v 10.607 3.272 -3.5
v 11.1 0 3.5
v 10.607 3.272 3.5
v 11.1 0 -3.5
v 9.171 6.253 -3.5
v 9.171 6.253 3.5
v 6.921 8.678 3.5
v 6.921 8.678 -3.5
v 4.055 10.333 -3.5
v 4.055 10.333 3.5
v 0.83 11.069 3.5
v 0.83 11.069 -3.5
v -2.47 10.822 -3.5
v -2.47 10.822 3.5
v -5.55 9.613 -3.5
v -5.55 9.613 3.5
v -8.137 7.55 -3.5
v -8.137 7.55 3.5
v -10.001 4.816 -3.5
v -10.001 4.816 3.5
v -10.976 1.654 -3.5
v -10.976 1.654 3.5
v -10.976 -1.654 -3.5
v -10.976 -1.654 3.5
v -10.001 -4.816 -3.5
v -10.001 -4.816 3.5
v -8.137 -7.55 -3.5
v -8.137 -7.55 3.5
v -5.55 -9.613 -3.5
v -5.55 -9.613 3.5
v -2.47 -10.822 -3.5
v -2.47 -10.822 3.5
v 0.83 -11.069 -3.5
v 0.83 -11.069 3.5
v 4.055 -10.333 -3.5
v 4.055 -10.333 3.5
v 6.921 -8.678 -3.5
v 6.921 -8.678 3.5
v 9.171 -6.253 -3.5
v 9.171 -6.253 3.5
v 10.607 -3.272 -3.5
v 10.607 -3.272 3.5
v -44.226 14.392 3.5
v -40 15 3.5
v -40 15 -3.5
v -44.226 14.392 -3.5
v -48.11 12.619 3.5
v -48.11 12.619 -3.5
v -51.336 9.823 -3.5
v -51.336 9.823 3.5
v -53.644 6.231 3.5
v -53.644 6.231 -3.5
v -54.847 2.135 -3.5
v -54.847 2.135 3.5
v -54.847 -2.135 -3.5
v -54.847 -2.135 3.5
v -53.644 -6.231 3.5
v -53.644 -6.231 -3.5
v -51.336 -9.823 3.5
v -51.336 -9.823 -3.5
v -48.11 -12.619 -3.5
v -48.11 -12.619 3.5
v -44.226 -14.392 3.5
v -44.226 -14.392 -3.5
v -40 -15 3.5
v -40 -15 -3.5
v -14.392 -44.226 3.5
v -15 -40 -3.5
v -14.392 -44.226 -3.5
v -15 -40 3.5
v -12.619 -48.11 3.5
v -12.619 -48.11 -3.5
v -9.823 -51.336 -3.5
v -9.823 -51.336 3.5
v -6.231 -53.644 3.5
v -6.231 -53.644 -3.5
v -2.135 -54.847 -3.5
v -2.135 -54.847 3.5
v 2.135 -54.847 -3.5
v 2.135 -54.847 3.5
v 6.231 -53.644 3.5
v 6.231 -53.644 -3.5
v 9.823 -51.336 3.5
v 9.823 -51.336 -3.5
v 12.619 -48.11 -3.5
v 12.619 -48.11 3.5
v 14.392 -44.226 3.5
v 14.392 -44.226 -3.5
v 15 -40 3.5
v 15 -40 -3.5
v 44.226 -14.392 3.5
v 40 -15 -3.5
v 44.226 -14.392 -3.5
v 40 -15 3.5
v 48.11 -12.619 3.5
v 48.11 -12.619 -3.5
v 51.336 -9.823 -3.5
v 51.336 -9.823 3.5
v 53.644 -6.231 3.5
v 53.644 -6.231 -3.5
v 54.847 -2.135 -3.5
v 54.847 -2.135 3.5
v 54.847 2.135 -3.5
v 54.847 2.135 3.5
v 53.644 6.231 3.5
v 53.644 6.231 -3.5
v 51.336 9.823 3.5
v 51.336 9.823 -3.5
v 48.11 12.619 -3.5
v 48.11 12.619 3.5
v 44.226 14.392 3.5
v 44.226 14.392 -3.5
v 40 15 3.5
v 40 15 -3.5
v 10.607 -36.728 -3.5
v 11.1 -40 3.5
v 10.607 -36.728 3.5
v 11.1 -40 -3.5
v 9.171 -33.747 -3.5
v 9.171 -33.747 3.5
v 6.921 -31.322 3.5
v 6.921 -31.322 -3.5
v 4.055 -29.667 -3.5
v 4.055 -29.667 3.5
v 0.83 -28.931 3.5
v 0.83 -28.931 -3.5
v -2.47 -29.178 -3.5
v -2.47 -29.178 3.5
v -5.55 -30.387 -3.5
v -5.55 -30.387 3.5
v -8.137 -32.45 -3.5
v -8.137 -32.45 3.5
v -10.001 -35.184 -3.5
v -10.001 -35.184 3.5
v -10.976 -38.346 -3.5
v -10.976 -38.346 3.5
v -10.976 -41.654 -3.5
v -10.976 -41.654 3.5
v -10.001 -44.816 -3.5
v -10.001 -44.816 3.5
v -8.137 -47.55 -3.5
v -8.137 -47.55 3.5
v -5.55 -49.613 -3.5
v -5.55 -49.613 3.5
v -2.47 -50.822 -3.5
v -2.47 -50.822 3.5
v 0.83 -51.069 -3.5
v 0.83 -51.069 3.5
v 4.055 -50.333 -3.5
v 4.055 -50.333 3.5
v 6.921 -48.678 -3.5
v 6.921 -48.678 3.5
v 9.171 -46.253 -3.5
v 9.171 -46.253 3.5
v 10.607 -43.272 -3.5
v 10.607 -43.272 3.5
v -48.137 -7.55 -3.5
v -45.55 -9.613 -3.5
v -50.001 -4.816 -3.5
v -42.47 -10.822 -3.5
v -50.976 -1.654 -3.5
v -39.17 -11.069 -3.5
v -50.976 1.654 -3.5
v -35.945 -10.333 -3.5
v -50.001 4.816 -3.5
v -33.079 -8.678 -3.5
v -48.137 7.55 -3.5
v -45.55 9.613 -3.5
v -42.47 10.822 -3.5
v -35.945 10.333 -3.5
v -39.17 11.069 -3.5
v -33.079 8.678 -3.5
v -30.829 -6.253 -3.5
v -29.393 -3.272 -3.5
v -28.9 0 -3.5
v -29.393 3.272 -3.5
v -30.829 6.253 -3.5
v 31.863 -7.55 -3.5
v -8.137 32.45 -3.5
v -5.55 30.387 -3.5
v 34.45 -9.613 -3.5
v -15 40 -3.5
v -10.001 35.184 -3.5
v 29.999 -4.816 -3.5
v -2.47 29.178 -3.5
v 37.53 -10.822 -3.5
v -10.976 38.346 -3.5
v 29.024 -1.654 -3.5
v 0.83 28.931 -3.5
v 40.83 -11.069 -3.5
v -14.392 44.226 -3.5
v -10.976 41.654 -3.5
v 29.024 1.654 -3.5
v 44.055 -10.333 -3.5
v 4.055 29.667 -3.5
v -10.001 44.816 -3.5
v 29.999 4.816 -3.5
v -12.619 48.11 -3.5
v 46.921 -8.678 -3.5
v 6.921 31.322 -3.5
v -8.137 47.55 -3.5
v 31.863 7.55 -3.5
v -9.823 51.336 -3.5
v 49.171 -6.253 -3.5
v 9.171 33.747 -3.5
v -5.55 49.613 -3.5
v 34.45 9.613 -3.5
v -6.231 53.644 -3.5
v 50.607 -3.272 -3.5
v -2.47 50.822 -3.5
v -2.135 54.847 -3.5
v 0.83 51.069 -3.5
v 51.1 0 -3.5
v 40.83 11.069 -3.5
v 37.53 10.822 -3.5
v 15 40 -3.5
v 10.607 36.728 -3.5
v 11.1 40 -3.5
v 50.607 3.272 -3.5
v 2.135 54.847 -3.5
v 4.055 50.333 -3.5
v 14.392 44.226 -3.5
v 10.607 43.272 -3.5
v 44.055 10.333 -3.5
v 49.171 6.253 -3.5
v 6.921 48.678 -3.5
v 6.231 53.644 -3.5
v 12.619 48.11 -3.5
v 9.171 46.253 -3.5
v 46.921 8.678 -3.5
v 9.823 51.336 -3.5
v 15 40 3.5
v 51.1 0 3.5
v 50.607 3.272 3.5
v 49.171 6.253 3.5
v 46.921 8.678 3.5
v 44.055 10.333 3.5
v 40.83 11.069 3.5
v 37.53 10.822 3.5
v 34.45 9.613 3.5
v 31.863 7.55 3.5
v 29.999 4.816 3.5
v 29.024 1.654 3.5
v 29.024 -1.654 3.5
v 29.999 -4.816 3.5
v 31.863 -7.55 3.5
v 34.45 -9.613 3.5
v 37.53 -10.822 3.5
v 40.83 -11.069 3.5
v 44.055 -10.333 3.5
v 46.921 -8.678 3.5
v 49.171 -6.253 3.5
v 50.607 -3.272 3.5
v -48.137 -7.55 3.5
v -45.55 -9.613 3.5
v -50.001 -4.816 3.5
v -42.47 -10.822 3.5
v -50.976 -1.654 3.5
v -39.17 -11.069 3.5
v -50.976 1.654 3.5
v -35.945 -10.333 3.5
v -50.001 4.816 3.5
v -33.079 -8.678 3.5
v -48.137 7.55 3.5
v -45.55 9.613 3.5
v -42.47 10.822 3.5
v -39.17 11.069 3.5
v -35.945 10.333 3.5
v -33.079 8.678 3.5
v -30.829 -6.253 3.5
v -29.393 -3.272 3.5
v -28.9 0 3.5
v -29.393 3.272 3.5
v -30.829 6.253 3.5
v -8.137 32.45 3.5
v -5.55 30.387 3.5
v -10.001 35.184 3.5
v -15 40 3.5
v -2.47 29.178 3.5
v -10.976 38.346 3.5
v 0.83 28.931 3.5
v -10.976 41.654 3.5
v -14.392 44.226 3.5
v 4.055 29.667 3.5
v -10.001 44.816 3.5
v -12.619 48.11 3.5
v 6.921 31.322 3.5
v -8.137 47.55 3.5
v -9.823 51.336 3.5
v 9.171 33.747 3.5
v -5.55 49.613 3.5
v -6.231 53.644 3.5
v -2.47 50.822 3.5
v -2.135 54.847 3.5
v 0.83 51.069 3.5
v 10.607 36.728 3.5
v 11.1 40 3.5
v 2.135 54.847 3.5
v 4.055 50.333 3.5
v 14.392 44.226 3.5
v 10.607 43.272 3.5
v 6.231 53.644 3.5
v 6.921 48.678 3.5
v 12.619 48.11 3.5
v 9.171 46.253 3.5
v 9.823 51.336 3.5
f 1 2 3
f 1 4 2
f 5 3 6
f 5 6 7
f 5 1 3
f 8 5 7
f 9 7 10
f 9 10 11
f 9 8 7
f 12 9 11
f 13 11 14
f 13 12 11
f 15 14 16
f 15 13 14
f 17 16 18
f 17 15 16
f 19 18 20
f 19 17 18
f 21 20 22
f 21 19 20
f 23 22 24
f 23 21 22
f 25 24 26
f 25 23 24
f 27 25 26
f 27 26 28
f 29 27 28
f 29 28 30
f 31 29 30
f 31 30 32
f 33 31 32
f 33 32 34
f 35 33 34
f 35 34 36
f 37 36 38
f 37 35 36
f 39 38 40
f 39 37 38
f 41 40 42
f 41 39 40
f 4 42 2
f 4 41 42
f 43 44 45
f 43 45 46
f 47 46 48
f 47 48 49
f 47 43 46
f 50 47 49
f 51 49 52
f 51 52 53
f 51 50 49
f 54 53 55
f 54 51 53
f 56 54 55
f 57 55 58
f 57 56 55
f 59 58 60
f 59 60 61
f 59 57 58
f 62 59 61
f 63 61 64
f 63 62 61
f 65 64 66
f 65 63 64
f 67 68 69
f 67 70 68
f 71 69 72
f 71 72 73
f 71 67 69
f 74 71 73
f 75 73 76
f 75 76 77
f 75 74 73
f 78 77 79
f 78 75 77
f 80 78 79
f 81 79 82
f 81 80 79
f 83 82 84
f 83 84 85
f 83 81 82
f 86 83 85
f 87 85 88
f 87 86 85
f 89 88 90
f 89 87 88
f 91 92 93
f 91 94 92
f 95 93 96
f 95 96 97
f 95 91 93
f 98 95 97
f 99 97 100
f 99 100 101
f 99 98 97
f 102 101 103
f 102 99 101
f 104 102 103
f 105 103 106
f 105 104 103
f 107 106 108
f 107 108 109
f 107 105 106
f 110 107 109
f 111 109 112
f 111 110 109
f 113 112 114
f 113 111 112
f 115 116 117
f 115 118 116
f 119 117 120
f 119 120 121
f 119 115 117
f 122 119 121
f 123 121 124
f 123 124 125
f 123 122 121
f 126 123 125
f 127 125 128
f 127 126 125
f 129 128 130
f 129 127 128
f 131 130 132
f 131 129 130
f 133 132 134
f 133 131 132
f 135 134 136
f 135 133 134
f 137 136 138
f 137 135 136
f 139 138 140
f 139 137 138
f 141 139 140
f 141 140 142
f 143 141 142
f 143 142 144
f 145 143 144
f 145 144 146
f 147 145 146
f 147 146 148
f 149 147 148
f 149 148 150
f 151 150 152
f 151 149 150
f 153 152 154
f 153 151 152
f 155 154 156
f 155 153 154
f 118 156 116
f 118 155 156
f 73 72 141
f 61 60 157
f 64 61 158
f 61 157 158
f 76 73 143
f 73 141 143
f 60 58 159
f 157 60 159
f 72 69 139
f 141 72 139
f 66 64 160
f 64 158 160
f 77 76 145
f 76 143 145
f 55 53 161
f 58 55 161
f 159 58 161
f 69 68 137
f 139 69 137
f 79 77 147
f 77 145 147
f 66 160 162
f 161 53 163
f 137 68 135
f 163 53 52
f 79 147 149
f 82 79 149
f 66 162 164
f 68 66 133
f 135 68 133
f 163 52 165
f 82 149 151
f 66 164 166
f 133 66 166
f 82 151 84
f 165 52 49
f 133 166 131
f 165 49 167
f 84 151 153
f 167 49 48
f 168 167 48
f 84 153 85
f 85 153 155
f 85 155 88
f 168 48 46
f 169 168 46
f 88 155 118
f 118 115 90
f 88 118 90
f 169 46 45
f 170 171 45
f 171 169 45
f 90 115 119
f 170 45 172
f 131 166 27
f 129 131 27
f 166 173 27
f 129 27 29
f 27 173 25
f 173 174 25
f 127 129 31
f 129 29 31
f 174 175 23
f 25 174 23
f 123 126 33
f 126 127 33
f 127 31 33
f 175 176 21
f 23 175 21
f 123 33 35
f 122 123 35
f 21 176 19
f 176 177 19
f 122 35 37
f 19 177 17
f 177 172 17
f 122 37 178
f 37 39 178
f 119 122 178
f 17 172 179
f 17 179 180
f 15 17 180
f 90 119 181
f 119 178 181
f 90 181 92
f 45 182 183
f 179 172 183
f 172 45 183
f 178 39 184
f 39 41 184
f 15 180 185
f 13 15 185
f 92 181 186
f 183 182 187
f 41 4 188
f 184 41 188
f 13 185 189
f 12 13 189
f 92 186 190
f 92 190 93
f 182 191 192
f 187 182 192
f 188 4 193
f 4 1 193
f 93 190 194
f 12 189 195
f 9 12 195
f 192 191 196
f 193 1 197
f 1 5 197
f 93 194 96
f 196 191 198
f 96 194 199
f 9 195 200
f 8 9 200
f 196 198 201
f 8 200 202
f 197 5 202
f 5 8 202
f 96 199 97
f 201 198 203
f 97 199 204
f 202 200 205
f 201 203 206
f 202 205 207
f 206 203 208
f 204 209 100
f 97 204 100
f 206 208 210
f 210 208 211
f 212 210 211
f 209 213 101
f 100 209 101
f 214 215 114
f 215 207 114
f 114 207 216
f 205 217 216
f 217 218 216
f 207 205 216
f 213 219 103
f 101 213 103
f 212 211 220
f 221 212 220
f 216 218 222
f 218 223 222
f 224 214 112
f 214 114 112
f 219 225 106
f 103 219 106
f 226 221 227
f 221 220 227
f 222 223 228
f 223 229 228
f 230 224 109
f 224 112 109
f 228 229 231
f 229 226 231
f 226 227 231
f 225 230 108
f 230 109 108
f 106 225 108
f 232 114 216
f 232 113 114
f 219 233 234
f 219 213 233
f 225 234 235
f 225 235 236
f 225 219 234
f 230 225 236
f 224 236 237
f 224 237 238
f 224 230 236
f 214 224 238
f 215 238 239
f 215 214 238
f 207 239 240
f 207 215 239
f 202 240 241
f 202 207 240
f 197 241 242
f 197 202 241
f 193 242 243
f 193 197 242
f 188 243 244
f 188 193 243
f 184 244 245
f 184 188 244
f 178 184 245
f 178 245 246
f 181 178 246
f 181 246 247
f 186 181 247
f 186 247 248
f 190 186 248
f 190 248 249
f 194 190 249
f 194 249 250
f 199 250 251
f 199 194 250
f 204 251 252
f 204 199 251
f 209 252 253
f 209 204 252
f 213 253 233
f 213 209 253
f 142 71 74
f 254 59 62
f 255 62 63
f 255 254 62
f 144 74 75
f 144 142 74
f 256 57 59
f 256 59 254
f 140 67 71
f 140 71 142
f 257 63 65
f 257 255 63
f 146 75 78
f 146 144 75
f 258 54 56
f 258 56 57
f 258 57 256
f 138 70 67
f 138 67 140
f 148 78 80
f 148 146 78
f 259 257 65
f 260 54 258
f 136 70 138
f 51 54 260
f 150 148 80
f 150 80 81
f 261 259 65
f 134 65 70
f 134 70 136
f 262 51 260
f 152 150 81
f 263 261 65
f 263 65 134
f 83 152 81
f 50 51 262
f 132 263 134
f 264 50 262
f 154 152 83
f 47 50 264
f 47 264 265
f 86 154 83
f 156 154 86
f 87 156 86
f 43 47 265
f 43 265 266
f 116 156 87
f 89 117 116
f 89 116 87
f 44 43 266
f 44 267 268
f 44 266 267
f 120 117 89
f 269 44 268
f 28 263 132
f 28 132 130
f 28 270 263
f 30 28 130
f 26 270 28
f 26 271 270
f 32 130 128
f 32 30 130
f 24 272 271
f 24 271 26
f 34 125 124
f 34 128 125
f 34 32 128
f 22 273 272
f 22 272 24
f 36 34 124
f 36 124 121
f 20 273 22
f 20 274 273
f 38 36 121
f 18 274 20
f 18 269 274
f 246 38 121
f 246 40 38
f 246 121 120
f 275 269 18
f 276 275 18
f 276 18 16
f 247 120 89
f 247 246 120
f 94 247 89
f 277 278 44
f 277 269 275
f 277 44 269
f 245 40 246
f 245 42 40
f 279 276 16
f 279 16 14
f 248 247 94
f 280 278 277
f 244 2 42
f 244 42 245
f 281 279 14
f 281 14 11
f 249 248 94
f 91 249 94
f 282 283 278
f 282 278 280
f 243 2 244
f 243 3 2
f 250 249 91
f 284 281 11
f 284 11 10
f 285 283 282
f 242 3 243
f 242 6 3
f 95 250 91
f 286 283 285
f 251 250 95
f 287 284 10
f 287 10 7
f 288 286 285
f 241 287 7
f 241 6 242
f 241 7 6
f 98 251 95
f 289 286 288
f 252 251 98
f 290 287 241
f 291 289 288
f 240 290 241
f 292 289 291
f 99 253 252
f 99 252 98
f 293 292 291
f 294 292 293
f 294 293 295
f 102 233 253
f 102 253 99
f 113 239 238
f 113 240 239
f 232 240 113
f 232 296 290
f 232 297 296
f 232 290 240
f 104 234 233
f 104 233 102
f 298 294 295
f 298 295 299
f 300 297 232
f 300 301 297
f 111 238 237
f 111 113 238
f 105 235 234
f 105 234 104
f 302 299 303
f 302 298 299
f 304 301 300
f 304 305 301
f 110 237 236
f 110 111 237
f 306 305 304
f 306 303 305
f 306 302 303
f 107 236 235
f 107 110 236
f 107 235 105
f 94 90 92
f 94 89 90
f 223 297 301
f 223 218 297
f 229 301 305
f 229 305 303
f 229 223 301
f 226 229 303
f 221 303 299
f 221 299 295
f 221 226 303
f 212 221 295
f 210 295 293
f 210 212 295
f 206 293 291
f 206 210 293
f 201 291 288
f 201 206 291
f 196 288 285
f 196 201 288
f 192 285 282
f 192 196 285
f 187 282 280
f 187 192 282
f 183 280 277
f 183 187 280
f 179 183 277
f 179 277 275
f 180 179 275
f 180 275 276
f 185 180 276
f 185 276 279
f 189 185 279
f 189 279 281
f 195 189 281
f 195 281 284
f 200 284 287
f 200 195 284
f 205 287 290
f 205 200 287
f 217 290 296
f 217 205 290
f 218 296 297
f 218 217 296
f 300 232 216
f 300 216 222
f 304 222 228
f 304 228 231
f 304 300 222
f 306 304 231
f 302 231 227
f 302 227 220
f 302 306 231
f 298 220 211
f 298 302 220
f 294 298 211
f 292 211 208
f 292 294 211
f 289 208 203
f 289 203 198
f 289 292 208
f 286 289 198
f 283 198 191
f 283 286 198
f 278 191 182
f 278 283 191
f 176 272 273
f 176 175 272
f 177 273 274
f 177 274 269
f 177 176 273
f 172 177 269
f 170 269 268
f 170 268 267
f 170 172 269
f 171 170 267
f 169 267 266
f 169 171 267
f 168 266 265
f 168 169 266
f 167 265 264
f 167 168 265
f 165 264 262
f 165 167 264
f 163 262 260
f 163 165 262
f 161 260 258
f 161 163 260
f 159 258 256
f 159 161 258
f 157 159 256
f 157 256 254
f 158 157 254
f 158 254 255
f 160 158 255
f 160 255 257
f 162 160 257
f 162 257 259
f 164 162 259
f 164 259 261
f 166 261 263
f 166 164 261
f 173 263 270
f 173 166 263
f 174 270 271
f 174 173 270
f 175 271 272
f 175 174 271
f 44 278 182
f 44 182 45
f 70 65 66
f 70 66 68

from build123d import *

# Parameters (mm, degrees)
F0_R     = 11.1
F1_DEPTH = 3.5


with BuildPart() as f1:
    # F0 (on Top) → F1 (new body, symmetric)
    with BuildSketch(Plane.XY):
        with BuildLine():
            Line((40, 15), (15, 40))
            ThreePointArc((15, 40), (0, 55), (-15, 40))
            Line((-15, 40), (-40, 15))
            ThreePointArc((-40, 15), (-55, 0), (-40, -15))
            Line((-40, -15), (-15, -40))
            ThreePointArc((-15, -40), (0, -55), (15, -40))
            Line((15, -40), (40, -15))
            ThreePointArc((40, -15), (55, 0), (40, 15))
        make_face()
        with Locations((0, -40)):
            Circle(F0_R, mode=Mode.SUBTRACT)
        with Locations((-40, 0)):
            Circle(F0_R, mode=Mode.SUBTRACT)
        Circle(F0_R, mode=Mode.SUBTRACT)
        with Locations((40, 0)):
            Circle(F0_R, mode=Mode.SUBTRACT)
        with Locations((0, 40)):
            Circle(F0_R, mode=Mode.SUBTRACT)
    extrude(amount=F1_DEPTH, both=True)


solid = f1.part
